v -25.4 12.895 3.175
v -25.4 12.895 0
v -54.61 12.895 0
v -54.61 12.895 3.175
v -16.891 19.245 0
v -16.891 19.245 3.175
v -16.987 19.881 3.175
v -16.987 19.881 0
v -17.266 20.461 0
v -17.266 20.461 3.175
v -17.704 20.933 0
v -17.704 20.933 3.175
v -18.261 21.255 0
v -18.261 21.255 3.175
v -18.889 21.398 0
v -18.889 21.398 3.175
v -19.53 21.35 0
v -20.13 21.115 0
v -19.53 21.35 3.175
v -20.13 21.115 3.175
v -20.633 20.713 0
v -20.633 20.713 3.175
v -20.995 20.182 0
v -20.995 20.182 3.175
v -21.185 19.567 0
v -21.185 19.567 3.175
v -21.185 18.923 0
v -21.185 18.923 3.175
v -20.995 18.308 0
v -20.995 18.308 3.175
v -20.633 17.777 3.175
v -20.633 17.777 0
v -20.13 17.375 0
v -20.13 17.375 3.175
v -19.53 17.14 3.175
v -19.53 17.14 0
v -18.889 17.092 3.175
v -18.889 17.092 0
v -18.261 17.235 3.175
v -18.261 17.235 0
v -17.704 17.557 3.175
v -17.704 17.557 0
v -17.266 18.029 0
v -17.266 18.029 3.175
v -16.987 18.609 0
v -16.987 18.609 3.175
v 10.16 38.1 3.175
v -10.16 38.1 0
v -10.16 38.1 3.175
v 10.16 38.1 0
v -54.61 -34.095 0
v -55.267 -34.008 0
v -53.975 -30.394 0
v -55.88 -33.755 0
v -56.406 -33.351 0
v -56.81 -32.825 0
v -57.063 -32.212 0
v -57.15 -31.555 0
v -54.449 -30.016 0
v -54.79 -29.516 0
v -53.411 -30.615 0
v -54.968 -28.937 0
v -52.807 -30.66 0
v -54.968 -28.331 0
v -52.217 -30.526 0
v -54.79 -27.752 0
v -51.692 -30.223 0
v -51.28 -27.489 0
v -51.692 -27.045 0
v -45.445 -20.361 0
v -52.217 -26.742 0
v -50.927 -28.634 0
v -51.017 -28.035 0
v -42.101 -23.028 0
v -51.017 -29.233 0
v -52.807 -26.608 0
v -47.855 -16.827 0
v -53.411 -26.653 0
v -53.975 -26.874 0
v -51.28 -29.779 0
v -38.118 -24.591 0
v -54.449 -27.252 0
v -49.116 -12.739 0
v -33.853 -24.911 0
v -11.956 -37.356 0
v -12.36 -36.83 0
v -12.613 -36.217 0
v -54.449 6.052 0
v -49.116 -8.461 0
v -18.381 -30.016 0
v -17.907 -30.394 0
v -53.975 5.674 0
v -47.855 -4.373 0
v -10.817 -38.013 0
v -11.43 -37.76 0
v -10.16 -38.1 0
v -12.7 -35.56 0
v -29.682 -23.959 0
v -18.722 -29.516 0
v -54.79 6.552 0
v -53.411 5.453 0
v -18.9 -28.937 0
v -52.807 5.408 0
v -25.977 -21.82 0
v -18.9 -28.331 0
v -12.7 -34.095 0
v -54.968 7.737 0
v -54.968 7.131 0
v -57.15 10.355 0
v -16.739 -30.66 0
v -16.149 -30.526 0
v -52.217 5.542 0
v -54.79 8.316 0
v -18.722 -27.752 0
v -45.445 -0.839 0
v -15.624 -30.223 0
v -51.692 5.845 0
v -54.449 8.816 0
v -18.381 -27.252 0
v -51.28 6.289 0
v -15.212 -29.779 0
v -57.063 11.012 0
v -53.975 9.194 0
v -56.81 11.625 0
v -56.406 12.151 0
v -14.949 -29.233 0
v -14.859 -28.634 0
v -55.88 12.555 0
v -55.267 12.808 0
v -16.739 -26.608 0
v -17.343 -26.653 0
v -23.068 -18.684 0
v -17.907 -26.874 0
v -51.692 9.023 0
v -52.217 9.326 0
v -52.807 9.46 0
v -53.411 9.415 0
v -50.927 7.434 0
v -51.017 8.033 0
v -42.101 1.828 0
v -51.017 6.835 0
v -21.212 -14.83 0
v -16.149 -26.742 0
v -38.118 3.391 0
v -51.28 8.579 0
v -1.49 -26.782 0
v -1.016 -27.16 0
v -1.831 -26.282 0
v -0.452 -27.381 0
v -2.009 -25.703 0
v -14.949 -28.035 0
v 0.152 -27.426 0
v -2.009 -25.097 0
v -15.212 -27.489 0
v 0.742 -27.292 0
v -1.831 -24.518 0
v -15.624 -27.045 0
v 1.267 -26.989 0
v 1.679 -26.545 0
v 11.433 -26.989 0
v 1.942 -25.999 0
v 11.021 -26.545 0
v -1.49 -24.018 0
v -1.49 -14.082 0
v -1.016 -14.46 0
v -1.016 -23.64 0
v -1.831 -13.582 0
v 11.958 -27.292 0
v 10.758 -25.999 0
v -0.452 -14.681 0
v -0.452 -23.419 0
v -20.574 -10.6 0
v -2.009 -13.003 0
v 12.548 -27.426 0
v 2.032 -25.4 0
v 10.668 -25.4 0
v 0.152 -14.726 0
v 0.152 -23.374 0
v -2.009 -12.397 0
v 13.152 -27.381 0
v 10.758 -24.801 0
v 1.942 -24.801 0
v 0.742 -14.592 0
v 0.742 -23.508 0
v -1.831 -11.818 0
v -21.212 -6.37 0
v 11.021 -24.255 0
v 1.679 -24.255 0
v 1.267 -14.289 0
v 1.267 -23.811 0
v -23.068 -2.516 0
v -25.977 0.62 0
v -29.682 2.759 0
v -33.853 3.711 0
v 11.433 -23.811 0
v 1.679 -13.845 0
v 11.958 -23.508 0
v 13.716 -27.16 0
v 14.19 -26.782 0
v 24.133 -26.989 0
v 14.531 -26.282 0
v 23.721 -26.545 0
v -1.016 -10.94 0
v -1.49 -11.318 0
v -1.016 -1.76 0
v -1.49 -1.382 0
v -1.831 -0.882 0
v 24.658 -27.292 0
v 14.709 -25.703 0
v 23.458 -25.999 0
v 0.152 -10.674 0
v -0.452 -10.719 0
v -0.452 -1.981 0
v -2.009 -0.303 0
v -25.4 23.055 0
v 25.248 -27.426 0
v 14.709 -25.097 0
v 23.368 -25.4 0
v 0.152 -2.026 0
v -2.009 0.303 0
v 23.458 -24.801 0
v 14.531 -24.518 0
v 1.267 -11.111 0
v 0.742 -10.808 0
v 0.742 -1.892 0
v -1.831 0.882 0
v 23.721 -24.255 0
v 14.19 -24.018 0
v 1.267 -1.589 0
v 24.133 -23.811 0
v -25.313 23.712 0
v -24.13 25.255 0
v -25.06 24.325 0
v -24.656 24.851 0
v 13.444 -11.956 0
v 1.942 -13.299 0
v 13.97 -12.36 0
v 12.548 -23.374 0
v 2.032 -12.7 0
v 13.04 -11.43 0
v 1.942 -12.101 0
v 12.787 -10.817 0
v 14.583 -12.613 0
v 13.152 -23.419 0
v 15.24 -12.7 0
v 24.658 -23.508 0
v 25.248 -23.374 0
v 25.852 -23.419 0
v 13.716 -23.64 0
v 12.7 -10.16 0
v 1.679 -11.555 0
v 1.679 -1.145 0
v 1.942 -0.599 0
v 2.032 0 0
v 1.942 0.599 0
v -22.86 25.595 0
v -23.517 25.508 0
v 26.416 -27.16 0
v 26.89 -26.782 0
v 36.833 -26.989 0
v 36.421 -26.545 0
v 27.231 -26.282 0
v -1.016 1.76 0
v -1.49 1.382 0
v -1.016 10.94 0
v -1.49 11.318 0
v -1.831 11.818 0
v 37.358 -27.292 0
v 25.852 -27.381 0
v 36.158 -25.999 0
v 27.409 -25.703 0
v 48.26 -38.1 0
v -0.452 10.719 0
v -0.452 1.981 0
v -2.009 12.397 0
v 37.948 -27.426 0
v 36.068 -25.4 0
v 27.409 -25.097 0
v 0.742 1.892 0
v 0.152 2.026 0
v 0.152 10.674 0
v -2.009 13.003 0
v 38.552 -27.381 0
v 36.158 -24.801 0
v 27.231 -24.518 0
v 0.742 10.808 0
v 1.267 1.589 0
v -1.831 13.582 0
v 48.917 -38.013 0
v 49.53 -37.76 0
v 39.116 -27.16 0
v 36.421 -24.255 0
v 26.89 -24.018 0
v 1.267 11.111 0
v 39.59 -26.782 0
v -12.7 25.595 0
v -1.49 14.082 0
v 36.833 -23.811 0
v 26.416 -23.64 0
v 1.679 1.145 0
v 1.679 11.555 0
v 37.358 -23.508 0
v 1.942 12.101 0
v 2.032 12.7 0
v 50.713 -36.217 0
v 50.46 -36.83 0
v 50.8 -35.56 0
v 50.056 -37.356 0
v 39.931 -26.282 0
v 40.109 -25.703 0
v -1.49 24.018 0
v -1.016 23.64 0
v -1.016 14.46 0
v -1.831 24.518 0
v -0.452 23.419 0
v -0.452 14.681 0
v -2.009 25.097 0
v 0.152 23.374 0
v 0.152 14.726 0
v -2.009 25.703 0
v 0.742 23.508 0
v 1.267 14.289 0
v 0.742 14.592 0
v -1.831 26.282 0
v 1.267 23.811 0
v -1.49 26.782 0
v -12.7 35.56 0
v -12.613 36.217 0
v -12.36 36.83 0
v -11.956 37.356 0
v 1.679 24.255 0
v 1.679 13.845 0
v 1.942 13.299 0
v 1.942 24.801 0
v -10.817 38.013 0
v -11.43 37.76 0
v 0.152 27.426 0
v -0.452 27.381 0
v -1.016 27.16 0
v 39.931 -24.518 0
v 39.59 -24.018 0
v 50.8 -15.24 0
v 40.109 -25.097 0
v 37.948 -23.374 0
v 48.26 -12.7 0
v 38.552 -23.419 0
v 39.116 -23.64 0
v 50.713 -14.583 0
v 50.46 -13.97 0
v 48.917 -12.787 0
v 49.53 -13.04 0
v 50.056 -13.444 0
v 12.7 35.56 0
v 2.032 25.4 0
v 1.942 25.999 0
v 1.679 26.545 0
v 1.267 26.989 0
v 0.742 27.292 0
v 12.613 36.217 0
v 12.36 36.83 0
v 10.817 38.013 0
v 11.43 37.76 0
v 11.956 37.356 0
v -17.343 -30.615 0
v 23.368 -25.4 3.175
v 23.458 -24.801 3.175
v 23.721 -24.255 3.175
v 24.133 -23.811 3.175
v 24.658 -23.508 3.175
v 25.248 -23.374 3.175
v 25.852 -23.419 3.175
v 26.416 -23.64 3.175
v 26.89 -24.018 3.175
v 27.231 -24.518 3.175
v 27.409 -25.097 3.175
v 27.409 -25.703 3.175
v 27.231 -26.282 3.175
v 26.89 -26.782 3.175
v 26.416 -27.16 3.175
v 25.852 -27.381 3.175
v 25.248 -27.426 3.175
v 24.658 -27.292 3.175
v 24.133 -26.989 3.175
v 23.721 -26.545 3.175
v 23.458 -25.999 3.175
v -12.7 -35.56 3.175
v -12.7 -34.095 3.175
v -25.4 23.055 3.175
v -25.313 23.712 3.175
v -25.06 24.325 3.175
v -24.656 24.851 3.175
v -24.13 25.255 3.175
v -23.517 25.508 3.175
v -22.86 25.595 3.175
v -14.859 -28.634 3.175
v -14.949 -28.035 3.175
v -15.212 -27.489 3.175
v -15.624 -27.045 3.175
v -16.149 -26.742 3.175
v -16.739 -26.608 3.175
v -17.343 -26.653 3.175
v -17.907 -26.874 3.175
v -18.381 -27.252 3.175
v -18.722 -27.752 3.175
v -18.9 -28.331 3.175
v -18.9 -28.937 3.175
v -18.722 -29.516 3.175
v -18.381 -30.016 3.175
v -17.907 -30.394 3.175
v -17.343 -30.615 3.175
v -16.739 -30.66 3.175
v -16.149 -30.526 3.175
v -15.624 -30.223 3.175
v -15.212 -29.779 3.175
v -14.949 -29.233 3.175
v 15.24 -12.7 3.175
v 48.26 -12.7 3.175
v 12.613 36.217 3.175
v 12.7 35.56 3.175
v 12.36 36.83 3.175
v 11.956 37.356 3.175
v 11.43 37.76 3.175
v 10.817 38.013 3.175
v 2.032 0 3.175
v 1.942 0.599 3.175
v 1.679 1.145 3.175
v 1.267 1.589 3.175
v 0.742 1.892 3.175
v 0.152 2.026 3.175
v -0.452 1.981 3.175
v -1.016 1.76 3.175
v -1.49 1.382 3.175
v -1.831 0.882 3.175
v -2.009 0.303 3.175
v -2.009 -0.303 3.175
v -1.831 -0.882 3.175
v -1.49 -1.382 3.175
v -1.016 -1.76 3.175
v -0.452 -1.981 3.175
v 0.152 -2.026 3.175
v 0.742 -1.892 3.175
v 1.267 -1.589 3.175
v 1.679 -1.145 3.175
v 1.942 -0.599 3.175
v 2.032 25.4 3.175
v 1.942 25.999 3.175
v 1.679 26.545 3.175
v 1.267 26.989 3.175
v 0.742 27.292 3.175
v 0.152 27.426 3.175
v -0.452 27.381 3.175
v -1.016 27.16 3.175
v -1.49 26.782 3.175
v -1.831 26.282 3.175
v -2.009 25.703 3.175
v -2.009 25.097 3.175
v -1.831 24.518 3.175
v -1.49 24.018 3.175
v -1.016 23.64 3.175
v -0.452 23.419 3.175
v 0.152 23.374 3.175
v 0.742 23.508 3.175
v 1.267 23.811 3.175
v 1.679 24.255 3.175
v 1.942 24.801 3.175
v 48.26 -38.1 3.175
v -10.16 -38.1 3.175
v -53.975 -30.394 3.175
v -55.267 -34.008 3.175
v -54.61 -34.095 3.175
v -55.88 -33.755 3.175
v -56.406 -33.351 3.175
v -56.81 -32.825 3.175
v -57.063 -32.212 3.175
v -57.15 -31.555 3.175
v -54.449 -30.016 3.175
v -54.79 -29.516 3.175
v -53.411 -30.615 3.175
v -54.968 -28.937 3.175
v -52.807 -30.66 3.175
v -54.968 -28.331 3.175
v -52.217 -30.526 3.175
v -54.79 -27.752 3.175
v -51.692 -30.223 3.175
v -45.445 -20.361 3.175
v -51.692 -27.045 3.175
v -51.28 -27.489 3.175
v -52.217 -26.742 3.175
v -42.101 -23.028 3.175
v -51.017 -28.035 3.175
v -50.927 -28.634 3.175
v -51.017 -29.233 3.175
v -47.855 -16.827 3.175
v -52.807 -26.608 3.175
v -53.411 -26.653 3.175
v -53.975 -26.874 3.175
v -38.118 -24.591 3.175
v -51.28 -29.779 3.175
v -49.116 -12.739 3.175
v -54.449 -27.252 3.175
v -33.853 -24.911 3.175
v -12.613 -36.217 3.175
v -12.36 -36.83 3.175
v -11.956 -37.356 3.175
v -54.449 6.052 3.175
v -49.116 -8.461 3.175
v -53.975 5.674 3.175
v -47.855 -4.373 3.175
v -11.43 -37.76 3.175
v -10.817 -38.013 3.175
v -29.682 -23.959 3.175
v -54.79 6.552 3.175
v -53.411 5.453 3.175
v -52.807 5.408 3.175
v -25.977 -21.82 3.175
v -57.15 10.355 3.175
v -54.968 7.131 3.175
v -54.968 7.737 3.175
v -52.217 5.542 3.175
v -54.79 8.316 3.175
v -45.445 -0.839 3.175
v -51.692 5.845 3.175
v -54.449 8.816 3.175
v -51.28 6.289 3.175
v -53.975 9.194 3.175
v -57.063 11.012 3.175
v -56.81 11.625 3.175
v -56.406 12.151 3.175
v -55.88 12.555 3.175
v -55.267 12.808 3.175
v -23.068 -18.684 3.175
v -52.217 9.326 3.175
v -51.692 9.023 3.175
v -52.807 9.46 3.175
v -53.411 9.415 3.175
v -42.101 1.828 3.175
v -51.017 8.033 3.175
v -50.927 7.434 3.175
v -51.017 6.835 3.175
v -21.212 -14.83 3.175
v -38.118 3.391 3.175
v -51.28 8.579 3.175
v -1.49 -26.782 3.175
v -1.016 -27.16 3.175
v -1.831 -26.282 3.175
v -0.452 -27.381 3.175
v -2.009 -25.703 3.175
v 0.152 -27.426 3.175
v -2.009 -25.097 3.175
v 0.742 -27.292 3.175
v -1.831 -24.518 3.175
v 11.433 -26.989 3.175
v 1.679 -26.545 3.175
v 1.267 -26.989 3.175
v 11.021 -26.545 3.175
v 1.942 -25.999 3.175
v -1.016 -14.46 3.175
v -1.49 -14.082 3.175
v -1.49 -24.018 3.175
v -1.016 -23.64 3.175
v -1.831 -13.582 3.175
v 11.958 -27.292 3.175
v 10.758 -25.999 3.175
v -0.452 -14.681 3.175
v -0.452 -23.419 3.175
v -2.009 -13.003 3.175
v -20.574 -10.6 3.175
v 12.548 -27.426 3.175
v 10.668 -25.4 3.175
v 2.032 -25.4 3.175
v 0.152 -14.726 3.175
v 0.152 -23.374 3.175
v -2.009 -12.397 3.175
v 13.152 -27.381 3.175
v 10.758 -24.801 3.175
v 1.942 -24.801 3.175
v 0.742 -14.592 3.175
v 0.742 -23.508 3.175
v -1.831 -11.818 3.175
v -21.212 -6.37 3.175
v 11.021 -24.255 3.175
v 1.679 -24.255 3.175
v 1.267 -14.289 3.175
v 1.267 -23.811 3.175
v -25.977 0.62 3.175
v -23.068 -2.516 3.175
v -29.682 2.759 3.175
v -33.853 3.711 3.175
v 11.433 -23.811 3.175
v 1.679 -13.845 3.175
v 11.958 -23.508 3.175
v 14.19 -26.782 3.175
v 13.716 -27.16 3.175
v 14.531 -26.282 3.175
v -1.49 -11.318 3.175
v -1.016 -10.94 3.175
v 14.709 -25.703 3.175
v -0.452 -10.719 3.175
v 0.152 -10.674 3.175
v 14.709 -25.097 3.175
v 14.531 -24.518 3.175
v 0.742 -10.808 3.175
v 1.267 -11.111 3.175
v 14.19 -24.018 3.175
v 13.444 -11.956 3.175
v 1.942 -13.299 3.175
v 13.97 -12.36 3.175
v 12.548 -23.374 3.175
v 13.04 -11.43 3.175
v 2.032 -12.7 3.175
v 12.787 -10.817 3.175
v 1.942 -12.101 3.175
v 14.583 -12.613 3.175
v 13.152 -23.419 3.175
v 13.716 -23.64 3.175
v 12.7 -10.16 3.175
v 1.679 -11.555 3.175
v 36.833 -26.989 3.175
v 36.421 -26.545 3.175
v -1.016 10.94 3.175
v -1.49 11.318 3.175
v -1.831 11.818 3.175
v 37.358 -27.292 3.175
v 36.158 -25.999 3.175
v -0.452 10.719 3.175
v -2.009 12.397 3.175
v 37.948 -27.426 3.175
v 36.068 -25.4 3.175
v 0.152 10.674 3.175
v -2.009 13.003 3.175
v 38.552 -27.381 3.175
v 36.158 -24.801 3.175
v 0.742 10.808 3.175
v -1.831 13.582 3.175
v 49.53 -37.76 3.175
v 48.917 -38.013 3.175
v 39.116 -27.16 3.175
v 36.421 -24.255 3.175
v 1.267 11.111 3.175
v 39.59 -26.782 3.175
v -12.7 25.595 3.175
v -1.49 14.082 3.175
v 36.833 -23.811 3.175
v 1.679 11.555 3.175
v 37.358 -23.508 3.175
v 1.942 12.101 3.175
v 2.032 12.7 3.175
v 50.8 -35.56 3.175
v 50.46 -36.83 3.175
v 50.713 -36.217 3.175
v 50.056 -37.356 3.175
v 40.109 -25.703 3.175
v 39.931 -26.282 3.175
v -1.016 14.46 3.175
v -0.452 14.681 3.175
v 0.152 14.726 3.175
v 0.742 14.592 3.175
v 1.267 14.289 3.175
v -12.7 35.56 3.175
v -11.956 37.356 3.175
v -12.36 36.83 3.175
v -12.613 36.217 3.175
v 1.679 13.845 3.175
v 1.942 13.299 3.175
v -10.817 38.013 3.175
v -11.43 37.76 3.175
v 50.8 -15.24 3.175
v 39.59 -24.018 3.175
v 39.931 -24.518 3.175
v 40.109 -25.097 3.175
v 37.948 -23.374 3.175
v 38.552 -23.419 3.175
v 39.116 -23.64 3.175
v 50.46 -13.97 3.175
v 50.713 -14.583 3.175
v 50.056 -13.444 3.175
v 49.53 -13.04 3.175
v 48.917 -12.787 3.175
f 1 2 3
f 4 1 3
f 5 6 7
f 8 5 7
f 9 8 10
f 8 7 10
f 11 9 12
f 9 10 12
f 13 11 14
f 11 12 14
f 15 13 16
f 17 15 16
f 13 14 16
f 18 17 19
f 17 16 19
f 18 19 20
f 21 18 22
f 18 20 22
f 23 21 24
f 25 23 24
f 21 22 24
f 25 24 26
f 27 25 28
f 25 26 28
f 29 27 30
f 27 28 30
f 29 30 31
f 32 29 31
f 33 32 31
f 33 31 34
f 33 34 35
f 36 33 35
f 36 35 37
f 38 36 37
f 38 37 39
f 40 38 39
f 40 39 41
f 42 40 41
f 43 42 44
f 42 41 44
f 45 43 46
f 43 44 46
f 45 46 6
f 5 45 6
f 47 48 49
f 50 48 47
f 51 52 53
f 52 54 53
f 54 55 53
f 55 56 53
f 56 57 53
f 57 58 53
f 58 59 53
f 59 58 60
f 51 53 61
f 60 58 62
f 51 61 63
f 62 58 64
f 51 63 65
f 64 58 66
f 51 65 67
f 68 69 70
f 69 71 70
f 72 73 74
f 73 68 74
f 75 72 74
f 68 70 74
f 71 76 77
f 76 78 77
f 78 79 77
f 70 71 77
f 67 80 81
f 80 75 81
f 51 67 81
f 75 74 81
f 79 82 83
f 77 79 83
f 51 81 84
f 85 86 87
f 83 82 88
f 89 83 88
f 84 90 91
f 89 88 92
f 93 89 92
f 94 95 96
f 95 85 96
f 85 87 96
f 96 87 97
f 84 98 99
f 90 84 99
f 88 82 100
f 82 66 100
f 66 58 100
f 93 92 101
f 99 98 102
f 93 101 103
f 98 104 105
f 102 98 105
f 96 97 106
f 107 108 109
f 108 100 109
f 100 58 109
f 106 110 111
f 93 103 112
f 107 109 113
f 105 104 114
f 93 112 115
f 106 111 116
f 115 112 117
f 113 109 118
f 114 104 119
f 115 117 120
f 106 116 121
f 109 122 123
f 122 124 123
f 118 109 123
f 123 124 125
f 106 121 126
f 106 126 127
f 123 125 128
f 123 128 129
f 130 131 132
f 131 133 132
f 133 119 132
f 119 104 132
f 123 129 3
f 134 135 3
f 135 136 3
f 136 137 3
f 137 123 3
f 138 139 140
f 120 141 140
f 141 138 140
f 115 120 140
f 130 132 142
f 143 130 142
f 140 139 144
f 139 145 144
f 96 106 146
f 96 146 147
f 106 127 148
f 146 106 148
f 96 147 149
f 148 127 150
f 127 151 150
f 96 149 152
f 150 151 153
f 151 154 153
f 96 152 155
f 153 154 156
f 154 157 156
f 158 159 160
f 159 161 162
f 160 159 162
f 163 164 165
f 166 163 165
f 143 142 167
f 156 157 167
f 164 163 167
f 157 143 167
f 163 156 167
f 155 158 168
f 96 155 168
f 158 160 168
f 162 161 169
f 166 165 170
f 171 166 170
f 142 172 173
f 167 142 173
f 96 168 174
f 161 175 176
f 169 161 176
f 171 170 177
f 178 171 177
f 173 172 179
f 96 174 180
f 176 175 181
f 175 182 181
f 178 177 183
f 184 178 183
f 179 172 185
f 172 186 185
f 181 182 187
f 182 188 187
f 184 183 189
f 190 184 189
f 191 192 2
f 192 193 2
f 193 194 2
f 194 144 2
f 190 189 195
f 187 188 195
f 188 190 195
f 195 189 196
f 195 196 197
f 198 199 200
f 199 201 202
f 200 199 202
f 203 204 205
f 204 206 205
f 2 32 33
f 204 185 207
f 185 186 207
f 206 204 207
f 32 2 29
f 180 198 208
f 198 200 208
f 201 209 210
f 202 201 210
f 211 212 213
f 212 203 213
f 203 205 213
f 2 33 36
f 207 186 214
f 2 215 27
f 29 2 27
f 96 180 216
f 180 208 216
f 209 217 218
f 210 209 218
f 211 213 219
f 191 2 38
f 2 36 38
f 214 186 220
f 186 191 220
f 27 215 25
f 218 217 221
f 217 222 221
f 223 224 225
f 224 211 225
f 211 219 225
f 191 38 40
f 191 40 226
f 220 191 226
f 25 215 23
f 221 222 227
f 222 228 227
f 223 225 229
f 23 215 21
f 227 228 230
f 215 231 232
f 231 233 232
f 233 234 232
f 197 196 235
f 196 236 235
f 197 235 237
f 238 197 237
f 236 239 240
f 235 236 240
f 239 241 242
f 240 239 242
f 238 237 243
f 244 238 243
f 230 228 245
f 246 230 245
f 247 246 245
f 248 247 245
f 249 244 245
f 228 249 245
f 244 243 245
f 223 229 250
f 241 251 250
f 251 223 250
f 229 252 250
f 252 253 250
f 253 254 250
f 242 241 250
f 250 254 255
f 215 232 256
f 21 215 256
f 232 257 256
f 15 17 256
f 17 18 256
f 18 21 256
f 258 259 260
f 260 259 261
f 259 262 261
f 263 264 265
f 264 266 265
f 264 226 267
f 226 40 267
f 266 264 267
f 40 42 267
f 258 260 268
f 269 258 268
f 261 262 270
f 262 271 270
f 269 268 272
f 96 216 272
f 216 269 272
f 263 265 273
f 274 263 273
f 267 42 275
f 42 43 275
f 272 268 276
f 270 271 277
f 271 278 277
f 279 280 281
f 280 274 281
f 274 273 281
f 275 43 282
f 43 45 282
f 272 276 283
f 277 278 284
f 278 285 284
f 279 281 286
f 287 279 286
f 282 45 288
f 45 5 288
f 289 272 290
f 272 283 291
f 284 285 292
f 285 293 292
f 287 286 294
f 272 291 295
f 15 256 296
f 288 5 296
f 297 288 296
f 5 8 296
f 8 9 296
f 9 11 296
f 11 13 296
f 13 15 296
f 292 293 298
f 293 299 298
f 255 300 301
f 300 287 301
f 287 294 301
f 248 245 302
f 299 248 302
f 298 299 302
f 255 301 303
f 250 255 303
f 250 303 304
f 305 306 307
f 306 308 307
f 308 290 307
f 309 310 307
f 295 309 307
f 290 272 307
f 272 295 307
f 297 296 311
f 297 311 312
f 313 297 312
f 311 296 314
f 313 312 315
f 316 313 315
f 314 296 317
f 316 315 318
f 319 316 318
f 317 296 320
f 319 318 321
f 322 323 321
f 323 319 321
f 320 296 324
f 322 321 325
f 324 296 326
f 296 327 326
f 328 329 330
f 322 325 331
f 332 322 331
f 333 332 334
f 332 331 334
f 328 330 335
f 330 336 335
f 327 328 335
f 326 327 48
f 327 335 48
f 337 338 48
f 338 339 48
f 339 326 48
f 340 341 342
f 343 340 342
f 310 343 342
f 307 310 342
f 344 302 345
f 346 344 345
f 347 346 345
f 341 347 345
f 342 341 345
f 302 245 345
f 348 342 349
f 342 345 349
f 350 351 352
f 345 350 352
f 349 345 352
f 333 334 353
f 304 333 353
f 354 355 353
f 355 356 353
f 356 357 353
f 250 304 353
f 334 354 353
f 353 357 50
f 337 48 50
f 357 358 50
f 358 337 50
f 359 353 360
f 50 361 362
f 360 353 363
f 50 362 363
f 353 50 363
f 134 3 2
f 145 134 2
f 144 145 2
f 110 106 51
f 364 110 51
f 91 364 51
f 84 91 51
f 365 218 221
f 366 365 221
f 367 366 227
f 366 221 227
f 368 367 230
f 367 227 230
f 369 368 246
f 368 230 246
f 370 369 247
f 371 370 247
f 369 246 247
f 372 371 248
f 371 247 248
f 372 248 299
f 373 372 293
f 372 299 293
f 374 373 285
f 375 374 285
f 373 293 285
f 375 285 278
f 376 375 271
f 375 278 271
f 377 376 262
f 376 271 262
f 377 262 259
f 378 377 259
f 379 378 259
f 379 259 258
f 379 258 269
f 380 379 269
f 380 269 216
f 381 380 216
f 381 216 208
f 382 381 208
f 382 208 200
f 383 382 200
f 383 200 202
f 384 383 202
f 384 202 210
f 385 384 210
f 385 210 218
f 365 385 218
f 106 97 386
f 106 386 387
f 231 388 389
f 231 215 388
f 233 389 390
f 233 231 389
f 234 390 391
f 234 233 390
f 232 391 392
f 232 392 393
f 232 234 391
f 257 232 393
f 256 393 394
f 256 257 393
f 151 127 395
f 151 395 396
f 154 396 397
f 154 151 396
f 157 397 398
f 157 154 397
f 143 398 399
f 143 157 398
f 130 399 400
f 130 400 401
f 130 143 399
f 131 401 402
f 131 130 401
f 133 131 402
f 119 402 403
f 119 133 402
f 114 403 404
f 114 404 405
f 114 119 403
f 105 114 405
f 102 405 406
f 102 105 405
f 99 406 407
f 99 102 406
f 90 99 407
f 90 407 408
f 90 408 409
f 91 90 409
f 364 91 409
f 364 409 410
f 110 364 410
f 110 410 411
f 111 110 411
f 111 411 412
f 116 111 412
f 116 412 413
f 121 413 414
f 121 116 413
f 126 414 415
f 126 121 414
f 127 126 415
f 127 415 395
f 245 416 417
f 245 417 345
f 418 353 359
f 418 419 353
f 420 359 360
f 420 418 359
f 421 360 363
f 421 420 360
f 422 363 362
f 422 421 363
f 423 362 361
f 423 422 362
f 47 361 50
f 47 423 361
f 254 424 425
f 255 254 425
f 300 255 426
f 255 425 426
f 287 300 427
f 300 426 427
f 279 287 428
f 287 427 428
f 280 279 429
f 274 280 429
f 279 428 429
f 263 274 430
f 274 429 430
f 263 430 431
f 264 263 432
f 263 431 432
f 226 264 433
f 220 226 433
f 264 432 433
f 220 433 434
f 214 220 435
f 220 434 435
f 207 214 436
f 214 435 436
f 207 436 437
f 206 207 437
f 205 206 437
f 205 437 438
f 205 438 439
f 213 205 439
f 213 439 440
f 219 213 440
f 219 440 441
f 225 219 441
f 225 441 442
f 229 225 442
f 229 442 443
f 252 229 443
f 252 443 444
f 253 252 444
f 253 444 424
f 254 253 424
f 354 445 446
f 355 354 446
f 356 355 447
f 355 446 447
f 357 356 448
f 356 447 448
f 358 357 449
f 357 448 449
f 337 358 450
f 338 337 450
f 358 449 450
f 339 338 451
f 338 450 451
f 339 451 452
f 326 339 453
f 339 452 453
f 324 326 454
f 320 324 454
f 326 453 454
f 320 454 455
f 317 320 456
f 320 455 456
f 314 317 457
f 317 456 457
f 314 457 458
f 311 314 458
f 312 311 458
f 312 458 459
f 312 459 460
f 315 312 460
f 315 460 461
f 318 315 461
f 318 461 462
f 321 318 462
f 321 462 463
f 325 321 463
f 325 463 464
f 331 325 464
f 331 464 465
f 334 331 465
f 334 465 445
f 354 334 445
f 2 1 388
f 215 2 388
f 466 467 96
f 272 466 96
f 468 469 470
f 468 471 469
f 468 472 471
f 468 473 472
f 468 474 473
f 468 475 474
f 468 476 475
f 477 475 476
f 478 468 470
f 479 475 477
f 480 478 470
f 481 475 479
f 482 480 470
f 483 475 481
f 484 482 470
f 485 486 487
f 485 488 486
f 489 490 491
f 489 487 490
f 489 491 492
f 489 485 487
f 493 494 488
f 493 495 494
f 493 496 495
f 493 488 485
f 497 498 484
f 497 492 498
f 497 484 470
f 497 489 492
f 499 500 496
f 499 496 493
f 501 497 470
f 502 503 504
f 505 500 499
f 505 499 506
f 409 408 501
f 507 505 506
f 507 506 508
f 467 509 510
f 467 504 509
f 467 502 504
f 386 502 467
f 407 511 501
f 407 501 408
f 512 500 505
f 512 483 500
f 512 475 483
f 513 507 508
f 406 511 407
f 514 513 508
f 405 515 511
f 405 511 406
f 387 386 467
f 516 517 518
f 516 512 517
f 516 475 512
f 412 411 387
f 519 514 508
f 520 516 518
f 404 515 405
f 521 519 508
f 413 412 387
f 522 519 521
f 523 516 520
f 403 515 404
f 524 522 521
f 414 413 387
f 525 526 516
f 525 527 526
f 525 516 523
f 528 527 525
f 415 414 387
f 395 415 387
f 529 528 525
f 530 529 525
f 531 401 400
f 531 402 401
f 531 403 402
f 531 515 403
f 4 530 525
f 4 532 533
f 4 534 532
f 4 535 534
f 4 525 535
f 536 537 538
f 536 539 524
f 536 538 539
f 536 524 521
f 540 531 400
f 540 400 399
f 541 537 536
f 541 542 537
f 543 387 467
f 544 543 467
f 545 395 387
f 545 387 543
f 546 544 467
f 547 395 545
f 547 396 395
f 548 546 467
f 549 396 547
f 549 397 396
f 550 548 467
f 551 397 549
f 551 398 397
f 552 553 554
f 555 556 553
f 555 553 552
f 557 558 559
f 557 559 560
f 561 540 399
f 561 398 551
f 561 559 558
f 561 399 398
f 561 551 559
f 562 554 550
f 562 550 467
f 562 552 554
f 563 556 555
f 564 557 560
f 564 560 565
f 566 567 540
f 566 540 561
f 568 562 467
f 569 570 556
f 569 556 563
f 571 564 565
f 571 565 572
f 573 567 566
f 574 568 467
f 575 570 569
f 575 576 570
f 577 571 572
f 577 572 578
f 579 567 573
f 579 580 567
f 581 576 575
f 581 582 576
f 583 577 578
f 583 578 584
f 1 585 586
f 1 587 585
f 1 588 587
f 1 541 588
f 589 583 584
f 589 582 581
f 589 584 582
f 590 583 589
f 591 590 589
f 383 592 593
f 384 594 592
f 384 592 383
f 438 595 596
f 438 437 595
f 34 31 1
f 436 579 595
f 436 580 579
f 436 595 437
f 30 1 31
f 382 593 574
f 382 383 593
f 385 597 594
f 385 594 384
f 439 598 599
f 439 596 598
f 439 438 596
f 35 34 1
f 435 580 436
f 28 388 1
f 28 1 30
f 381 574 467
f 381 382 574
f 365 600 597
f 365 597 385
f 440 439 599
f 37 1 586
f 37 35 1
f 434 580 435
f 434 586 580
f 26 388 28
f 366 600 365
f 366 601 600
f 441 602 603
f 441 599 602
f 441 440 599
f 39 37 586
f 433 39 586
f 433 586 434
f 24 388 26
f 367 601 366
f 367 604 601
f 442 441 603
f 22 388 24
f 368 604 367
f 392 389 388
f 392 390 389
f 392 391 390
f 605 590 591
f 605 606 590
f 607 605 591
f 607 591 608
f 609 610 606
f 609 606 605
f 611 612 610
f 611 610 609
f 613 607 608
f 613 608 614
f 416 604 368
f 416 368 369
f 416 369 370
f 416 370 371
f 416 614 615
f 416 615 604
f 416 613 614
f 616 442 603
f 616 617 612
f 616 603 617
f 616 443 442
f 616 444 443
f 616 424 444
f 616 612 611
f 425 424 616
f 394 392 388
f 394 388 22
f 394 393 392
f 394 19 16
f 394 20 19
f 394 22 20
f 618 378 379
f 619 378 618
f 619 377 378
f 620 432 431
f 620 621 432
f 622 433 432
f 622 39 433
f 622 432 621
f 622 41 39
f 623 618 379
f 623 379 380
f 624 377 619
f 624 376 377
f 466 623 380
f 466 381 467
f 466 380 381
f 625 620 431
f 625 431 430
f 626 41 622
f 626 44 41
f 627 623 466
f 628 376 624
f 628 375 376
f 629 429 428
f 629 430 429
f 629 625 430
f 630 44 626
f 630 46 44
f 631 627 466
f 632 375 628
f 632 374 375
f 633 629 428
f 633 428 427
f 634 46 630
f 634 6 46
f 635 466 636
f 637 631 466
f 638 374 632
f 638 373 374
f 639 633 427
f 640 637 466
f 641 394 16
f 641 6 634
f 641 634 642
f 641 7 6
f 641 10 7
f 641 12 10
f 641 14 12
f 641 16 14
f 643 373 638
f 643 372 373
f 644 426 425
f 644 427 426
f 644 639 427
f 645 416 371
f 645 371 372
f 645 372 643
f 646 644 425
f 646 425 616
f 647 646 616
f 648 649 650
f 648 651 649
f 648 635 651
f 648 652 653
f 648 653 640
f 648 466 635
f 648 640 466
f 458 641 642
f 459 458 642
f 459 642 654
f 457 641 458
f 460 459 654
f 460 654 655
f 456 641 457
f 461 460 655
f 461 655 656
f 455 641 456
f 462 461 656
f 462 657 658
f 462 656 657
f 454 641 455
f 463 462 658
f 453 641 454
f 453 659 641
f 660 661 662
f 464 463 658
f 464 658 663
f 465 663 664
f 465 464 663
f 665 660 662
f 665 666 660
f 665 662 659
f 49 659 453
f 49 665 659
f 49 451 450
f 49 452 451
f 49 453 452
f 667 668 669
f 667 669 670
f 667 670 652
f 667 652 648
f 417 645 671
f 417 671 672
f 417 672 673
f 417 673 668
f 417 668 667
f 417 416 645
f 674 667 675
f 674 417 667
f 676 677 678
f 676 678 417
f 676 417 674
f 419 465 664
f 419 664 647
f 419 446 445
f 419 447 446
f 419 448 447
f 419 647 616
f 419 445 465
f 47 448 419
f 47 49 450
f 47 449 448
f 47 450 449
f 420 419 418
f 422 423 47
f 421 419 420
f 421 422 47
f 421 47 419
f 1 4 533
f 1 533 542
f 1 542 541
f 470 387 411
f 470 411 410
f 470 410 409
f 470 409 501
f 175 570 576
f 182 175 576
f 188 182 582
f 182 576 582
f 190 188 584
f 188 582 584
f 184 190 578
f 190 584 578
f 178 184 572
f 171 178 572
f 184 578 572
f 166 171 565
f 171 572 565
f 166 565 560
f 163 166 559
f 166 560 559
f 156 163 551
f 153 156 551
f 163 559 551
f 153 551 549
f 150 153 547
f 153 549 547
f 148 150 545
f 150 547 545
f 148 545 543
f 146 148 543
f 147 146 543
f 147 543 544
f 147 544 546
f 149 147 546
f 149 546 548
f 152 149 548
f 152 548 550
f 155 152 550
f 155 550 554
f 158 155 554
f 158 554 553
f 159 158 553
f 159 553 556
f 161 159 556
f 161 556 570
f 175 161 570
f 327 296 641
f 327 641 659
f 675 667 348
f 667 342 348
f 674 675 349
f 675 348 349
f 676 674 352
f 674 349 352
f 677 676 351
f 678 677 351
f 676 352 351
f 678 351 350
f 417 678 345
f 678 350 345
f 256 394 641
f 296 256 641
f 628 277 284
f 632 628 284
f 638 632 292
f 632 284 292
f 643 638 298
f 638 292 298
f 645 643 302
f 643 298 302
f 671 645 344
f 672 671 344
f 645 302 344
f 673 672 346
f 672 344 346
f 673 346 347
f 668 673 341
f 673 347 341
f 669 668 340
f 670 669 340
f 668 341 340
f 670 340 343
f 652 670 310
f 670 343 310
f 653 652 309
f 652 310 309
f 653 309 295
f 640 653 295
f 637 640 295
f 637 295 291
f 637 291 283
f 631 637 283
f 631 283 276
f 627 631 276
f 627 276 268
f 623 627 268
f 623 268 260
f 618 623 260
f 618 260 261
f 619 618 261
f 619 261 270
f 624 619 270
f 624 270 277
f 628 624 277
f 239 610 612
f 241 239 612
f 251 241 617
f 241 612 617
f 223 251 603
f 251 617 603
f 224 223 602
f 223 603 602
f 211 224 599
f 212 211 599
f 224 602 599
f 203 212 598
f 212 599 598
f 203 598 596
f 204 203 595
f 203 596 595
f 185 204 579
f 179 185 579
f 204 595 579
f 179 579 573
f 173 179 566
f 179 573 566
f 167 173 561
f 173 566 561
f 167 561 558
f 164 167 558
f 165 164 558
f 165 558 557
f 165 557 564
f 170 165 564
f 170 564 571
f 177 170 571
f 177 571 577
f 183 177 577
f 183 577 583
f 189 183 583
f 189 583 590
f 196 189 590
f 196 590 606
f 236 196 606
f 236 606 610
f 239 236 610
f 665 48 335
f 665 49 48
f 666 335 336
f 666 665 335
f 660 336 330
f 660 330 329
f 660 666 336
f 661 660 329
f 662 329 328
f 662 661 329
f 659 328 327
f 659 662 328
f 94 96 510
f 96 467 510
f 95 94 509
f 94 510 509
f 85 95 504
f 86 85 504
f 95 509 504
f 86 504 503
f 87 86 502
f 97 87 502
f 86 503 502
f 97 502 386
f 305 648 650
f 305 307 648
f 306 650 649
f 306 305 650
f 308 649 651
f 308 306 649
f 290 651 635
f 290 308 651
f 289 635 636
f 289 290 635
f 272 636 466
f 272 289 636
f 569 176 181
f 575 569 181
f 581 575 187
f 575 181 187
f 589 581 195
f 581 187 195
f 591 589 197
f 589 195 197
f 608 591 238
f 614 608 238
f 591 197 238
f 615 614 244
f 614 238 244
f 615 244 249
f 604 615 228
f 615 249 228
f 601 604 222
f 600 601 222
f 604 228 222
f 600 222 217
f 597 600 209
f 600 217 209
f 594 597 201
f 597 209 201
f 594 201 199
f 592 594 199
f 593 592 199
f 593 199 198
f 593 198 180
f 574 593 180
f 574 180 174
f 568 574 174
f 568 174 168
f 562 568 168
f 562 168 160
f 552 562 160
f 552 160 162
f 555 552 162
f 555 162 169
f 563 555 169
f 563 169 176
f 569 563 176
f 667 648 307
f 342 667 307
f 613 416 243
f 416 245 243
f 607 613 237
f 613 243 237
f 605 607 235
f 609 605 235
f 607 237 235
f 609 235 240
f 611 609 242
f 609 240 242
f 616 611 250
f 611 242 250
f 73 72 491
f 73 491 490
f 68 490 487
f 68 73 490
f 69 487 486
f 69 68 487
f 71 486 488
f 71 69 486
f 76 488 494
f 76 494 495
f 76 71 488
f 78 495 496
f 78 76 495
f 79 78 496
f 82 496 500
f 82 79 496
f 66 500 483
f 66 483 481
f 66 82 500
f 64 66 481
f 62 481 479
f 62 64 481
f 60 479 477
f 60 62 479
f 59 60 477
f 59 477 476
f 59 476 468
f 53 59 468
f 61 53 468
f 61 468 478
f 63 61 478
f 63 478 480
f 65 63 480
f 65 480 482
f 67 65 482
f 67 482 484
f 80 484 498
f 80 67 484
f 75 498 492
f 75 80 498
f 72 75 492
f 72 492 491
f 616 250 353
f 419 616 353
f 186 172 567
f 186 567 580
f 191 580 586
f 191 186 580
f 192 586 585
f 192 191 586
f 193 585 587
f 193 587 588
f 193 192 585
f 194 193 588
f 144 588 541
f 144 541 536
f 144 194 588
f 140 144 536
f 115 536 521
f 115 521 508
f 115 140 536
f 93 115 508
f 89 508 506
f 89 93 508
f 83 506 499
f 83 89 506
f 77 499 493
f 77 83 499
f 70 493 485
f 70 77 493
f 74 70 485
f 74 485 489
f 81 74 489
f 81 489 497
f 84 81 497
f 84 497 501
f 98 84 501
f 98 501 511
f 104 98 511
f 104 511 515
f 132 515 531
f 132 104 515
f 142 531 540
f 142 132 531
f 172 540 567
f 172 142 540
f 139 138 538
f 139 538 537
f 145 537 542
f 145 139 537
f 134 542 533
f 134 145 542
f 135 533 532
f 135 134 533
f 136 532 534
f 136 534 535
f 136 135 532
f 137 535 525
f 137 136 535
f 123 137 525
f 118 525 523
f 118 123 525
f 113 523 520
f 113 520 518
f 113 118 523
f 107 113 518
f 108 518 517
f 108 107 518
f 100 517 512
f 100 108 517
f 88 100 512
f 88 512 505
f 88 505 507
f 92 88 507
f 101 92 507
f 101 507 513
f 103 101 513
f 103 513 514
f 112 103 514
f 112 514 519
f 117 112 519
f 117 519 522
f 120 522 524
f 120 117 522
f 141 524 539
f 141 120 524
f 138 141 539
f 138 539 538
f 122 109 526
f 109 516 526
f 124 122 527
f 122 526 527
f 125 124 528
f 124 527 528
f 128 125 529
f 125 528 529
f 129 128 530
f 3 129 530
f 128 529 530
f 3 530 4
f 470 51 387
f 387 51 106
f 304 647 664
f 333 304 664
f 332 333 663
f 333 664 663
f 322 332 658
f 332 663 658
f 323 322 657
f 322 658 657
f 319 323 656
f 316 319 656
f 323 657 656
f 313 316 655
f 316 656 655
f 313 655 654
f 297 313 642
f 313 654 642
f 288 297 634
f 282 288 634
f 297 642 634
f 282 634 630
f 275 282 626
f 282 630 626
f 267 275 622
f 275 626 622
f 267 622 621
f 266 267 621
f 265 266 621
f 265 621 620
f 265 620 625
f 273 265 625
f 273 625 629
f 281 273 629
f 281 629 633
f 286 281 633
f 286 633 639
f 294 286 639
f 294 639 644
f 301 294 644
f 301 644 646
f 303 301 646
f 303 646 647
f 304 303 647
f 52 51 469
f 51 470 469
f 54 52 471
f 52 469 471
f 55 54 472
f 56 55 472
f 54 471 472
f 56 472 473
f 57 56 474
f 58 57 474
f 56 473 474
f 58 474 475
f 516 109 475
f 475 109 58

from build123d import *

# Parameters (mm, degrees)
SKETCH1_R           = 2.032
SKETCH1_R_2         = 14.351
SKETCH1_W           = 25.4
SKETCH1_H           = 76.2
BOSS_EXTRUDE1_DEPTH = 3.175
SKETCH2_R           = 2.032
CUT_EXTRUDE1_DEPTH  = 69.759094853
SKETCH4_W           = 3.175
SKETCH4_H           = 25.4
BOSS_EXTRUDE2_DEPTH = 38.1
SKETCH5_R           = 2.032
CUT_EXTRUDE2_DEPTH  = 69.759094853
FILLET5_R           = 2.54
SKETCH6_W           = 12.7
SKETCH6_H           = 12.7
SKETCH6_R           = 2.159
BOSS_EXTRUDE3_DEPTH = 3.175
FILLET6_R           = 2.54


with BuildPart() as part:
    # Sketch1 → Boss-Extrude1 (new body)
    # profile 1 of 2: a face of its own
    with BuildSketch(Plane.XY):
        Polygon((-57.15, -34.095), (-12.7, -34.095), (-12.7, -24.638), (-12.7, 12.895), (-57.15, 12.895), align=None)
        with Locations((-52.959, -28.634)):
            Circle(SKETCH1_R, mode=Mode.SUBTRACT)
        with Locations((-34.925, -10.6)):
            Circle(SKETCH1_R_2, mode=Mode.SUBTRACT)
        with Locations((-16.891, -28.634)):
            Circle(SKETCH1_R, mode=Mode.SUBTRACT)
        with Locations((-52.959, 7.434)):
            Circle(SKETCH1_R, mode=Mode.SUBTRACT)
    # profile 2 of 2: a face of its own
    with BuildSketch(Plane.XY):
        Rectangle(SKETCH1_W, SKETCH1_H)
    extrude(amount=BOSS_EXTRUDE1_DEPTH)

    # Sketch2 → Cut-Extrude1 (cut, through all)
    with BuildSketch(Plane.XY.offset(3.175)):
        Circle(SKETCH2_R)
        with Locations((0, 12.7)):
            Circle(SKETCH2_R)
        with Locations((0, 25.4)):
            Circle(SKETCH2_R)
        with Locations((0, -12.7)):
            Circle(SKETCH2_R)
        with Locations((0, -25.4)):
            Circle(SKETCH2_R)
    extrude(amount=-CUT_EXTRUDE1_DEPTH, mode=Mode.SUBTRACT)

    # Sketch4 → Boss-Extrude2 (add)
    with BuildSketch(Plane(origin=(12.7, 0, 0), x_dir=(0, 0, -1), z_dir=(1, 0, 0))):
        with Locations((-1.5875, -25.4)):
            Rectangle(SKETCH4_W, SKETCH4_H)
    extrude(amount=BOSS_EXTRUDE2_DEPTH)

    # Sketch5 → Cut-Extrude2 (cut, through all)
    with BuildSketch(Plane(origin=(0, 0, 0), x_dir=(-1, 0, 0), z_dir=(0, 0, -1))):
        with Locations(Location((0, -25.4, 0), (0, 0, 180))):
            Circle(SKETCH5_R)
        with Locations((-12.7, -25.4)):
            Circle(SKETCH5_R)
        with Locations((-25.4, -25.4)):
            Circle(SKETCH5_R)
        with Locations((-38.1, -25.4)):
            Circle(SKETCH5_R)
    extrude(amount=-CUT_EXTRUDE2_DEPTH, mode=Mode.SUBTRACT)

    # Fillet5
    fillet5_edges = [part.edges().sort_by_distance(p)[0] for p in [
        (-12.7, -38.1, 1.5875),
        (-57.15, -34.095, 1.5875),
        (-57.15, 12.895, 1.5875),
        (-12.7, 12.895, 1.5875),
        (-12.7, 38.1, 1.5875),
        (12.7, 38.1, 1.5875),
        (12.7, -12.7, 1.5875),
        (50.8, -38.1, 1.5875),
        (50.8, -12.7, 1.5875),
    ]]
    fillet(fillet5_edges, radius=FILLET5_R)

    # Sketch6 → Boss-Extrude3 (add)
    with BuildSketch(Plane.XY.offset(3.175)):
        with Locations((-19.05, 19.245)):
            Rectangle(SKETCH6_W, SKETCH6_H)
        with Locations((-19.05, 19.245)):
            Circle(SKETCH6_R, mode=Mode.SUBTRACT)
    extrude(amount=-BOSS_EXTRUDE3_DEPTH)

    # Fillet6
    fillet6_edges = [part.edges().sort_by_distance(p)[0] for p in [
        (-25.4, 25.595, 1.5875),
    ]]
    fillet(fillet6_edges, radius=FILLET6_R)


solid = part.part
